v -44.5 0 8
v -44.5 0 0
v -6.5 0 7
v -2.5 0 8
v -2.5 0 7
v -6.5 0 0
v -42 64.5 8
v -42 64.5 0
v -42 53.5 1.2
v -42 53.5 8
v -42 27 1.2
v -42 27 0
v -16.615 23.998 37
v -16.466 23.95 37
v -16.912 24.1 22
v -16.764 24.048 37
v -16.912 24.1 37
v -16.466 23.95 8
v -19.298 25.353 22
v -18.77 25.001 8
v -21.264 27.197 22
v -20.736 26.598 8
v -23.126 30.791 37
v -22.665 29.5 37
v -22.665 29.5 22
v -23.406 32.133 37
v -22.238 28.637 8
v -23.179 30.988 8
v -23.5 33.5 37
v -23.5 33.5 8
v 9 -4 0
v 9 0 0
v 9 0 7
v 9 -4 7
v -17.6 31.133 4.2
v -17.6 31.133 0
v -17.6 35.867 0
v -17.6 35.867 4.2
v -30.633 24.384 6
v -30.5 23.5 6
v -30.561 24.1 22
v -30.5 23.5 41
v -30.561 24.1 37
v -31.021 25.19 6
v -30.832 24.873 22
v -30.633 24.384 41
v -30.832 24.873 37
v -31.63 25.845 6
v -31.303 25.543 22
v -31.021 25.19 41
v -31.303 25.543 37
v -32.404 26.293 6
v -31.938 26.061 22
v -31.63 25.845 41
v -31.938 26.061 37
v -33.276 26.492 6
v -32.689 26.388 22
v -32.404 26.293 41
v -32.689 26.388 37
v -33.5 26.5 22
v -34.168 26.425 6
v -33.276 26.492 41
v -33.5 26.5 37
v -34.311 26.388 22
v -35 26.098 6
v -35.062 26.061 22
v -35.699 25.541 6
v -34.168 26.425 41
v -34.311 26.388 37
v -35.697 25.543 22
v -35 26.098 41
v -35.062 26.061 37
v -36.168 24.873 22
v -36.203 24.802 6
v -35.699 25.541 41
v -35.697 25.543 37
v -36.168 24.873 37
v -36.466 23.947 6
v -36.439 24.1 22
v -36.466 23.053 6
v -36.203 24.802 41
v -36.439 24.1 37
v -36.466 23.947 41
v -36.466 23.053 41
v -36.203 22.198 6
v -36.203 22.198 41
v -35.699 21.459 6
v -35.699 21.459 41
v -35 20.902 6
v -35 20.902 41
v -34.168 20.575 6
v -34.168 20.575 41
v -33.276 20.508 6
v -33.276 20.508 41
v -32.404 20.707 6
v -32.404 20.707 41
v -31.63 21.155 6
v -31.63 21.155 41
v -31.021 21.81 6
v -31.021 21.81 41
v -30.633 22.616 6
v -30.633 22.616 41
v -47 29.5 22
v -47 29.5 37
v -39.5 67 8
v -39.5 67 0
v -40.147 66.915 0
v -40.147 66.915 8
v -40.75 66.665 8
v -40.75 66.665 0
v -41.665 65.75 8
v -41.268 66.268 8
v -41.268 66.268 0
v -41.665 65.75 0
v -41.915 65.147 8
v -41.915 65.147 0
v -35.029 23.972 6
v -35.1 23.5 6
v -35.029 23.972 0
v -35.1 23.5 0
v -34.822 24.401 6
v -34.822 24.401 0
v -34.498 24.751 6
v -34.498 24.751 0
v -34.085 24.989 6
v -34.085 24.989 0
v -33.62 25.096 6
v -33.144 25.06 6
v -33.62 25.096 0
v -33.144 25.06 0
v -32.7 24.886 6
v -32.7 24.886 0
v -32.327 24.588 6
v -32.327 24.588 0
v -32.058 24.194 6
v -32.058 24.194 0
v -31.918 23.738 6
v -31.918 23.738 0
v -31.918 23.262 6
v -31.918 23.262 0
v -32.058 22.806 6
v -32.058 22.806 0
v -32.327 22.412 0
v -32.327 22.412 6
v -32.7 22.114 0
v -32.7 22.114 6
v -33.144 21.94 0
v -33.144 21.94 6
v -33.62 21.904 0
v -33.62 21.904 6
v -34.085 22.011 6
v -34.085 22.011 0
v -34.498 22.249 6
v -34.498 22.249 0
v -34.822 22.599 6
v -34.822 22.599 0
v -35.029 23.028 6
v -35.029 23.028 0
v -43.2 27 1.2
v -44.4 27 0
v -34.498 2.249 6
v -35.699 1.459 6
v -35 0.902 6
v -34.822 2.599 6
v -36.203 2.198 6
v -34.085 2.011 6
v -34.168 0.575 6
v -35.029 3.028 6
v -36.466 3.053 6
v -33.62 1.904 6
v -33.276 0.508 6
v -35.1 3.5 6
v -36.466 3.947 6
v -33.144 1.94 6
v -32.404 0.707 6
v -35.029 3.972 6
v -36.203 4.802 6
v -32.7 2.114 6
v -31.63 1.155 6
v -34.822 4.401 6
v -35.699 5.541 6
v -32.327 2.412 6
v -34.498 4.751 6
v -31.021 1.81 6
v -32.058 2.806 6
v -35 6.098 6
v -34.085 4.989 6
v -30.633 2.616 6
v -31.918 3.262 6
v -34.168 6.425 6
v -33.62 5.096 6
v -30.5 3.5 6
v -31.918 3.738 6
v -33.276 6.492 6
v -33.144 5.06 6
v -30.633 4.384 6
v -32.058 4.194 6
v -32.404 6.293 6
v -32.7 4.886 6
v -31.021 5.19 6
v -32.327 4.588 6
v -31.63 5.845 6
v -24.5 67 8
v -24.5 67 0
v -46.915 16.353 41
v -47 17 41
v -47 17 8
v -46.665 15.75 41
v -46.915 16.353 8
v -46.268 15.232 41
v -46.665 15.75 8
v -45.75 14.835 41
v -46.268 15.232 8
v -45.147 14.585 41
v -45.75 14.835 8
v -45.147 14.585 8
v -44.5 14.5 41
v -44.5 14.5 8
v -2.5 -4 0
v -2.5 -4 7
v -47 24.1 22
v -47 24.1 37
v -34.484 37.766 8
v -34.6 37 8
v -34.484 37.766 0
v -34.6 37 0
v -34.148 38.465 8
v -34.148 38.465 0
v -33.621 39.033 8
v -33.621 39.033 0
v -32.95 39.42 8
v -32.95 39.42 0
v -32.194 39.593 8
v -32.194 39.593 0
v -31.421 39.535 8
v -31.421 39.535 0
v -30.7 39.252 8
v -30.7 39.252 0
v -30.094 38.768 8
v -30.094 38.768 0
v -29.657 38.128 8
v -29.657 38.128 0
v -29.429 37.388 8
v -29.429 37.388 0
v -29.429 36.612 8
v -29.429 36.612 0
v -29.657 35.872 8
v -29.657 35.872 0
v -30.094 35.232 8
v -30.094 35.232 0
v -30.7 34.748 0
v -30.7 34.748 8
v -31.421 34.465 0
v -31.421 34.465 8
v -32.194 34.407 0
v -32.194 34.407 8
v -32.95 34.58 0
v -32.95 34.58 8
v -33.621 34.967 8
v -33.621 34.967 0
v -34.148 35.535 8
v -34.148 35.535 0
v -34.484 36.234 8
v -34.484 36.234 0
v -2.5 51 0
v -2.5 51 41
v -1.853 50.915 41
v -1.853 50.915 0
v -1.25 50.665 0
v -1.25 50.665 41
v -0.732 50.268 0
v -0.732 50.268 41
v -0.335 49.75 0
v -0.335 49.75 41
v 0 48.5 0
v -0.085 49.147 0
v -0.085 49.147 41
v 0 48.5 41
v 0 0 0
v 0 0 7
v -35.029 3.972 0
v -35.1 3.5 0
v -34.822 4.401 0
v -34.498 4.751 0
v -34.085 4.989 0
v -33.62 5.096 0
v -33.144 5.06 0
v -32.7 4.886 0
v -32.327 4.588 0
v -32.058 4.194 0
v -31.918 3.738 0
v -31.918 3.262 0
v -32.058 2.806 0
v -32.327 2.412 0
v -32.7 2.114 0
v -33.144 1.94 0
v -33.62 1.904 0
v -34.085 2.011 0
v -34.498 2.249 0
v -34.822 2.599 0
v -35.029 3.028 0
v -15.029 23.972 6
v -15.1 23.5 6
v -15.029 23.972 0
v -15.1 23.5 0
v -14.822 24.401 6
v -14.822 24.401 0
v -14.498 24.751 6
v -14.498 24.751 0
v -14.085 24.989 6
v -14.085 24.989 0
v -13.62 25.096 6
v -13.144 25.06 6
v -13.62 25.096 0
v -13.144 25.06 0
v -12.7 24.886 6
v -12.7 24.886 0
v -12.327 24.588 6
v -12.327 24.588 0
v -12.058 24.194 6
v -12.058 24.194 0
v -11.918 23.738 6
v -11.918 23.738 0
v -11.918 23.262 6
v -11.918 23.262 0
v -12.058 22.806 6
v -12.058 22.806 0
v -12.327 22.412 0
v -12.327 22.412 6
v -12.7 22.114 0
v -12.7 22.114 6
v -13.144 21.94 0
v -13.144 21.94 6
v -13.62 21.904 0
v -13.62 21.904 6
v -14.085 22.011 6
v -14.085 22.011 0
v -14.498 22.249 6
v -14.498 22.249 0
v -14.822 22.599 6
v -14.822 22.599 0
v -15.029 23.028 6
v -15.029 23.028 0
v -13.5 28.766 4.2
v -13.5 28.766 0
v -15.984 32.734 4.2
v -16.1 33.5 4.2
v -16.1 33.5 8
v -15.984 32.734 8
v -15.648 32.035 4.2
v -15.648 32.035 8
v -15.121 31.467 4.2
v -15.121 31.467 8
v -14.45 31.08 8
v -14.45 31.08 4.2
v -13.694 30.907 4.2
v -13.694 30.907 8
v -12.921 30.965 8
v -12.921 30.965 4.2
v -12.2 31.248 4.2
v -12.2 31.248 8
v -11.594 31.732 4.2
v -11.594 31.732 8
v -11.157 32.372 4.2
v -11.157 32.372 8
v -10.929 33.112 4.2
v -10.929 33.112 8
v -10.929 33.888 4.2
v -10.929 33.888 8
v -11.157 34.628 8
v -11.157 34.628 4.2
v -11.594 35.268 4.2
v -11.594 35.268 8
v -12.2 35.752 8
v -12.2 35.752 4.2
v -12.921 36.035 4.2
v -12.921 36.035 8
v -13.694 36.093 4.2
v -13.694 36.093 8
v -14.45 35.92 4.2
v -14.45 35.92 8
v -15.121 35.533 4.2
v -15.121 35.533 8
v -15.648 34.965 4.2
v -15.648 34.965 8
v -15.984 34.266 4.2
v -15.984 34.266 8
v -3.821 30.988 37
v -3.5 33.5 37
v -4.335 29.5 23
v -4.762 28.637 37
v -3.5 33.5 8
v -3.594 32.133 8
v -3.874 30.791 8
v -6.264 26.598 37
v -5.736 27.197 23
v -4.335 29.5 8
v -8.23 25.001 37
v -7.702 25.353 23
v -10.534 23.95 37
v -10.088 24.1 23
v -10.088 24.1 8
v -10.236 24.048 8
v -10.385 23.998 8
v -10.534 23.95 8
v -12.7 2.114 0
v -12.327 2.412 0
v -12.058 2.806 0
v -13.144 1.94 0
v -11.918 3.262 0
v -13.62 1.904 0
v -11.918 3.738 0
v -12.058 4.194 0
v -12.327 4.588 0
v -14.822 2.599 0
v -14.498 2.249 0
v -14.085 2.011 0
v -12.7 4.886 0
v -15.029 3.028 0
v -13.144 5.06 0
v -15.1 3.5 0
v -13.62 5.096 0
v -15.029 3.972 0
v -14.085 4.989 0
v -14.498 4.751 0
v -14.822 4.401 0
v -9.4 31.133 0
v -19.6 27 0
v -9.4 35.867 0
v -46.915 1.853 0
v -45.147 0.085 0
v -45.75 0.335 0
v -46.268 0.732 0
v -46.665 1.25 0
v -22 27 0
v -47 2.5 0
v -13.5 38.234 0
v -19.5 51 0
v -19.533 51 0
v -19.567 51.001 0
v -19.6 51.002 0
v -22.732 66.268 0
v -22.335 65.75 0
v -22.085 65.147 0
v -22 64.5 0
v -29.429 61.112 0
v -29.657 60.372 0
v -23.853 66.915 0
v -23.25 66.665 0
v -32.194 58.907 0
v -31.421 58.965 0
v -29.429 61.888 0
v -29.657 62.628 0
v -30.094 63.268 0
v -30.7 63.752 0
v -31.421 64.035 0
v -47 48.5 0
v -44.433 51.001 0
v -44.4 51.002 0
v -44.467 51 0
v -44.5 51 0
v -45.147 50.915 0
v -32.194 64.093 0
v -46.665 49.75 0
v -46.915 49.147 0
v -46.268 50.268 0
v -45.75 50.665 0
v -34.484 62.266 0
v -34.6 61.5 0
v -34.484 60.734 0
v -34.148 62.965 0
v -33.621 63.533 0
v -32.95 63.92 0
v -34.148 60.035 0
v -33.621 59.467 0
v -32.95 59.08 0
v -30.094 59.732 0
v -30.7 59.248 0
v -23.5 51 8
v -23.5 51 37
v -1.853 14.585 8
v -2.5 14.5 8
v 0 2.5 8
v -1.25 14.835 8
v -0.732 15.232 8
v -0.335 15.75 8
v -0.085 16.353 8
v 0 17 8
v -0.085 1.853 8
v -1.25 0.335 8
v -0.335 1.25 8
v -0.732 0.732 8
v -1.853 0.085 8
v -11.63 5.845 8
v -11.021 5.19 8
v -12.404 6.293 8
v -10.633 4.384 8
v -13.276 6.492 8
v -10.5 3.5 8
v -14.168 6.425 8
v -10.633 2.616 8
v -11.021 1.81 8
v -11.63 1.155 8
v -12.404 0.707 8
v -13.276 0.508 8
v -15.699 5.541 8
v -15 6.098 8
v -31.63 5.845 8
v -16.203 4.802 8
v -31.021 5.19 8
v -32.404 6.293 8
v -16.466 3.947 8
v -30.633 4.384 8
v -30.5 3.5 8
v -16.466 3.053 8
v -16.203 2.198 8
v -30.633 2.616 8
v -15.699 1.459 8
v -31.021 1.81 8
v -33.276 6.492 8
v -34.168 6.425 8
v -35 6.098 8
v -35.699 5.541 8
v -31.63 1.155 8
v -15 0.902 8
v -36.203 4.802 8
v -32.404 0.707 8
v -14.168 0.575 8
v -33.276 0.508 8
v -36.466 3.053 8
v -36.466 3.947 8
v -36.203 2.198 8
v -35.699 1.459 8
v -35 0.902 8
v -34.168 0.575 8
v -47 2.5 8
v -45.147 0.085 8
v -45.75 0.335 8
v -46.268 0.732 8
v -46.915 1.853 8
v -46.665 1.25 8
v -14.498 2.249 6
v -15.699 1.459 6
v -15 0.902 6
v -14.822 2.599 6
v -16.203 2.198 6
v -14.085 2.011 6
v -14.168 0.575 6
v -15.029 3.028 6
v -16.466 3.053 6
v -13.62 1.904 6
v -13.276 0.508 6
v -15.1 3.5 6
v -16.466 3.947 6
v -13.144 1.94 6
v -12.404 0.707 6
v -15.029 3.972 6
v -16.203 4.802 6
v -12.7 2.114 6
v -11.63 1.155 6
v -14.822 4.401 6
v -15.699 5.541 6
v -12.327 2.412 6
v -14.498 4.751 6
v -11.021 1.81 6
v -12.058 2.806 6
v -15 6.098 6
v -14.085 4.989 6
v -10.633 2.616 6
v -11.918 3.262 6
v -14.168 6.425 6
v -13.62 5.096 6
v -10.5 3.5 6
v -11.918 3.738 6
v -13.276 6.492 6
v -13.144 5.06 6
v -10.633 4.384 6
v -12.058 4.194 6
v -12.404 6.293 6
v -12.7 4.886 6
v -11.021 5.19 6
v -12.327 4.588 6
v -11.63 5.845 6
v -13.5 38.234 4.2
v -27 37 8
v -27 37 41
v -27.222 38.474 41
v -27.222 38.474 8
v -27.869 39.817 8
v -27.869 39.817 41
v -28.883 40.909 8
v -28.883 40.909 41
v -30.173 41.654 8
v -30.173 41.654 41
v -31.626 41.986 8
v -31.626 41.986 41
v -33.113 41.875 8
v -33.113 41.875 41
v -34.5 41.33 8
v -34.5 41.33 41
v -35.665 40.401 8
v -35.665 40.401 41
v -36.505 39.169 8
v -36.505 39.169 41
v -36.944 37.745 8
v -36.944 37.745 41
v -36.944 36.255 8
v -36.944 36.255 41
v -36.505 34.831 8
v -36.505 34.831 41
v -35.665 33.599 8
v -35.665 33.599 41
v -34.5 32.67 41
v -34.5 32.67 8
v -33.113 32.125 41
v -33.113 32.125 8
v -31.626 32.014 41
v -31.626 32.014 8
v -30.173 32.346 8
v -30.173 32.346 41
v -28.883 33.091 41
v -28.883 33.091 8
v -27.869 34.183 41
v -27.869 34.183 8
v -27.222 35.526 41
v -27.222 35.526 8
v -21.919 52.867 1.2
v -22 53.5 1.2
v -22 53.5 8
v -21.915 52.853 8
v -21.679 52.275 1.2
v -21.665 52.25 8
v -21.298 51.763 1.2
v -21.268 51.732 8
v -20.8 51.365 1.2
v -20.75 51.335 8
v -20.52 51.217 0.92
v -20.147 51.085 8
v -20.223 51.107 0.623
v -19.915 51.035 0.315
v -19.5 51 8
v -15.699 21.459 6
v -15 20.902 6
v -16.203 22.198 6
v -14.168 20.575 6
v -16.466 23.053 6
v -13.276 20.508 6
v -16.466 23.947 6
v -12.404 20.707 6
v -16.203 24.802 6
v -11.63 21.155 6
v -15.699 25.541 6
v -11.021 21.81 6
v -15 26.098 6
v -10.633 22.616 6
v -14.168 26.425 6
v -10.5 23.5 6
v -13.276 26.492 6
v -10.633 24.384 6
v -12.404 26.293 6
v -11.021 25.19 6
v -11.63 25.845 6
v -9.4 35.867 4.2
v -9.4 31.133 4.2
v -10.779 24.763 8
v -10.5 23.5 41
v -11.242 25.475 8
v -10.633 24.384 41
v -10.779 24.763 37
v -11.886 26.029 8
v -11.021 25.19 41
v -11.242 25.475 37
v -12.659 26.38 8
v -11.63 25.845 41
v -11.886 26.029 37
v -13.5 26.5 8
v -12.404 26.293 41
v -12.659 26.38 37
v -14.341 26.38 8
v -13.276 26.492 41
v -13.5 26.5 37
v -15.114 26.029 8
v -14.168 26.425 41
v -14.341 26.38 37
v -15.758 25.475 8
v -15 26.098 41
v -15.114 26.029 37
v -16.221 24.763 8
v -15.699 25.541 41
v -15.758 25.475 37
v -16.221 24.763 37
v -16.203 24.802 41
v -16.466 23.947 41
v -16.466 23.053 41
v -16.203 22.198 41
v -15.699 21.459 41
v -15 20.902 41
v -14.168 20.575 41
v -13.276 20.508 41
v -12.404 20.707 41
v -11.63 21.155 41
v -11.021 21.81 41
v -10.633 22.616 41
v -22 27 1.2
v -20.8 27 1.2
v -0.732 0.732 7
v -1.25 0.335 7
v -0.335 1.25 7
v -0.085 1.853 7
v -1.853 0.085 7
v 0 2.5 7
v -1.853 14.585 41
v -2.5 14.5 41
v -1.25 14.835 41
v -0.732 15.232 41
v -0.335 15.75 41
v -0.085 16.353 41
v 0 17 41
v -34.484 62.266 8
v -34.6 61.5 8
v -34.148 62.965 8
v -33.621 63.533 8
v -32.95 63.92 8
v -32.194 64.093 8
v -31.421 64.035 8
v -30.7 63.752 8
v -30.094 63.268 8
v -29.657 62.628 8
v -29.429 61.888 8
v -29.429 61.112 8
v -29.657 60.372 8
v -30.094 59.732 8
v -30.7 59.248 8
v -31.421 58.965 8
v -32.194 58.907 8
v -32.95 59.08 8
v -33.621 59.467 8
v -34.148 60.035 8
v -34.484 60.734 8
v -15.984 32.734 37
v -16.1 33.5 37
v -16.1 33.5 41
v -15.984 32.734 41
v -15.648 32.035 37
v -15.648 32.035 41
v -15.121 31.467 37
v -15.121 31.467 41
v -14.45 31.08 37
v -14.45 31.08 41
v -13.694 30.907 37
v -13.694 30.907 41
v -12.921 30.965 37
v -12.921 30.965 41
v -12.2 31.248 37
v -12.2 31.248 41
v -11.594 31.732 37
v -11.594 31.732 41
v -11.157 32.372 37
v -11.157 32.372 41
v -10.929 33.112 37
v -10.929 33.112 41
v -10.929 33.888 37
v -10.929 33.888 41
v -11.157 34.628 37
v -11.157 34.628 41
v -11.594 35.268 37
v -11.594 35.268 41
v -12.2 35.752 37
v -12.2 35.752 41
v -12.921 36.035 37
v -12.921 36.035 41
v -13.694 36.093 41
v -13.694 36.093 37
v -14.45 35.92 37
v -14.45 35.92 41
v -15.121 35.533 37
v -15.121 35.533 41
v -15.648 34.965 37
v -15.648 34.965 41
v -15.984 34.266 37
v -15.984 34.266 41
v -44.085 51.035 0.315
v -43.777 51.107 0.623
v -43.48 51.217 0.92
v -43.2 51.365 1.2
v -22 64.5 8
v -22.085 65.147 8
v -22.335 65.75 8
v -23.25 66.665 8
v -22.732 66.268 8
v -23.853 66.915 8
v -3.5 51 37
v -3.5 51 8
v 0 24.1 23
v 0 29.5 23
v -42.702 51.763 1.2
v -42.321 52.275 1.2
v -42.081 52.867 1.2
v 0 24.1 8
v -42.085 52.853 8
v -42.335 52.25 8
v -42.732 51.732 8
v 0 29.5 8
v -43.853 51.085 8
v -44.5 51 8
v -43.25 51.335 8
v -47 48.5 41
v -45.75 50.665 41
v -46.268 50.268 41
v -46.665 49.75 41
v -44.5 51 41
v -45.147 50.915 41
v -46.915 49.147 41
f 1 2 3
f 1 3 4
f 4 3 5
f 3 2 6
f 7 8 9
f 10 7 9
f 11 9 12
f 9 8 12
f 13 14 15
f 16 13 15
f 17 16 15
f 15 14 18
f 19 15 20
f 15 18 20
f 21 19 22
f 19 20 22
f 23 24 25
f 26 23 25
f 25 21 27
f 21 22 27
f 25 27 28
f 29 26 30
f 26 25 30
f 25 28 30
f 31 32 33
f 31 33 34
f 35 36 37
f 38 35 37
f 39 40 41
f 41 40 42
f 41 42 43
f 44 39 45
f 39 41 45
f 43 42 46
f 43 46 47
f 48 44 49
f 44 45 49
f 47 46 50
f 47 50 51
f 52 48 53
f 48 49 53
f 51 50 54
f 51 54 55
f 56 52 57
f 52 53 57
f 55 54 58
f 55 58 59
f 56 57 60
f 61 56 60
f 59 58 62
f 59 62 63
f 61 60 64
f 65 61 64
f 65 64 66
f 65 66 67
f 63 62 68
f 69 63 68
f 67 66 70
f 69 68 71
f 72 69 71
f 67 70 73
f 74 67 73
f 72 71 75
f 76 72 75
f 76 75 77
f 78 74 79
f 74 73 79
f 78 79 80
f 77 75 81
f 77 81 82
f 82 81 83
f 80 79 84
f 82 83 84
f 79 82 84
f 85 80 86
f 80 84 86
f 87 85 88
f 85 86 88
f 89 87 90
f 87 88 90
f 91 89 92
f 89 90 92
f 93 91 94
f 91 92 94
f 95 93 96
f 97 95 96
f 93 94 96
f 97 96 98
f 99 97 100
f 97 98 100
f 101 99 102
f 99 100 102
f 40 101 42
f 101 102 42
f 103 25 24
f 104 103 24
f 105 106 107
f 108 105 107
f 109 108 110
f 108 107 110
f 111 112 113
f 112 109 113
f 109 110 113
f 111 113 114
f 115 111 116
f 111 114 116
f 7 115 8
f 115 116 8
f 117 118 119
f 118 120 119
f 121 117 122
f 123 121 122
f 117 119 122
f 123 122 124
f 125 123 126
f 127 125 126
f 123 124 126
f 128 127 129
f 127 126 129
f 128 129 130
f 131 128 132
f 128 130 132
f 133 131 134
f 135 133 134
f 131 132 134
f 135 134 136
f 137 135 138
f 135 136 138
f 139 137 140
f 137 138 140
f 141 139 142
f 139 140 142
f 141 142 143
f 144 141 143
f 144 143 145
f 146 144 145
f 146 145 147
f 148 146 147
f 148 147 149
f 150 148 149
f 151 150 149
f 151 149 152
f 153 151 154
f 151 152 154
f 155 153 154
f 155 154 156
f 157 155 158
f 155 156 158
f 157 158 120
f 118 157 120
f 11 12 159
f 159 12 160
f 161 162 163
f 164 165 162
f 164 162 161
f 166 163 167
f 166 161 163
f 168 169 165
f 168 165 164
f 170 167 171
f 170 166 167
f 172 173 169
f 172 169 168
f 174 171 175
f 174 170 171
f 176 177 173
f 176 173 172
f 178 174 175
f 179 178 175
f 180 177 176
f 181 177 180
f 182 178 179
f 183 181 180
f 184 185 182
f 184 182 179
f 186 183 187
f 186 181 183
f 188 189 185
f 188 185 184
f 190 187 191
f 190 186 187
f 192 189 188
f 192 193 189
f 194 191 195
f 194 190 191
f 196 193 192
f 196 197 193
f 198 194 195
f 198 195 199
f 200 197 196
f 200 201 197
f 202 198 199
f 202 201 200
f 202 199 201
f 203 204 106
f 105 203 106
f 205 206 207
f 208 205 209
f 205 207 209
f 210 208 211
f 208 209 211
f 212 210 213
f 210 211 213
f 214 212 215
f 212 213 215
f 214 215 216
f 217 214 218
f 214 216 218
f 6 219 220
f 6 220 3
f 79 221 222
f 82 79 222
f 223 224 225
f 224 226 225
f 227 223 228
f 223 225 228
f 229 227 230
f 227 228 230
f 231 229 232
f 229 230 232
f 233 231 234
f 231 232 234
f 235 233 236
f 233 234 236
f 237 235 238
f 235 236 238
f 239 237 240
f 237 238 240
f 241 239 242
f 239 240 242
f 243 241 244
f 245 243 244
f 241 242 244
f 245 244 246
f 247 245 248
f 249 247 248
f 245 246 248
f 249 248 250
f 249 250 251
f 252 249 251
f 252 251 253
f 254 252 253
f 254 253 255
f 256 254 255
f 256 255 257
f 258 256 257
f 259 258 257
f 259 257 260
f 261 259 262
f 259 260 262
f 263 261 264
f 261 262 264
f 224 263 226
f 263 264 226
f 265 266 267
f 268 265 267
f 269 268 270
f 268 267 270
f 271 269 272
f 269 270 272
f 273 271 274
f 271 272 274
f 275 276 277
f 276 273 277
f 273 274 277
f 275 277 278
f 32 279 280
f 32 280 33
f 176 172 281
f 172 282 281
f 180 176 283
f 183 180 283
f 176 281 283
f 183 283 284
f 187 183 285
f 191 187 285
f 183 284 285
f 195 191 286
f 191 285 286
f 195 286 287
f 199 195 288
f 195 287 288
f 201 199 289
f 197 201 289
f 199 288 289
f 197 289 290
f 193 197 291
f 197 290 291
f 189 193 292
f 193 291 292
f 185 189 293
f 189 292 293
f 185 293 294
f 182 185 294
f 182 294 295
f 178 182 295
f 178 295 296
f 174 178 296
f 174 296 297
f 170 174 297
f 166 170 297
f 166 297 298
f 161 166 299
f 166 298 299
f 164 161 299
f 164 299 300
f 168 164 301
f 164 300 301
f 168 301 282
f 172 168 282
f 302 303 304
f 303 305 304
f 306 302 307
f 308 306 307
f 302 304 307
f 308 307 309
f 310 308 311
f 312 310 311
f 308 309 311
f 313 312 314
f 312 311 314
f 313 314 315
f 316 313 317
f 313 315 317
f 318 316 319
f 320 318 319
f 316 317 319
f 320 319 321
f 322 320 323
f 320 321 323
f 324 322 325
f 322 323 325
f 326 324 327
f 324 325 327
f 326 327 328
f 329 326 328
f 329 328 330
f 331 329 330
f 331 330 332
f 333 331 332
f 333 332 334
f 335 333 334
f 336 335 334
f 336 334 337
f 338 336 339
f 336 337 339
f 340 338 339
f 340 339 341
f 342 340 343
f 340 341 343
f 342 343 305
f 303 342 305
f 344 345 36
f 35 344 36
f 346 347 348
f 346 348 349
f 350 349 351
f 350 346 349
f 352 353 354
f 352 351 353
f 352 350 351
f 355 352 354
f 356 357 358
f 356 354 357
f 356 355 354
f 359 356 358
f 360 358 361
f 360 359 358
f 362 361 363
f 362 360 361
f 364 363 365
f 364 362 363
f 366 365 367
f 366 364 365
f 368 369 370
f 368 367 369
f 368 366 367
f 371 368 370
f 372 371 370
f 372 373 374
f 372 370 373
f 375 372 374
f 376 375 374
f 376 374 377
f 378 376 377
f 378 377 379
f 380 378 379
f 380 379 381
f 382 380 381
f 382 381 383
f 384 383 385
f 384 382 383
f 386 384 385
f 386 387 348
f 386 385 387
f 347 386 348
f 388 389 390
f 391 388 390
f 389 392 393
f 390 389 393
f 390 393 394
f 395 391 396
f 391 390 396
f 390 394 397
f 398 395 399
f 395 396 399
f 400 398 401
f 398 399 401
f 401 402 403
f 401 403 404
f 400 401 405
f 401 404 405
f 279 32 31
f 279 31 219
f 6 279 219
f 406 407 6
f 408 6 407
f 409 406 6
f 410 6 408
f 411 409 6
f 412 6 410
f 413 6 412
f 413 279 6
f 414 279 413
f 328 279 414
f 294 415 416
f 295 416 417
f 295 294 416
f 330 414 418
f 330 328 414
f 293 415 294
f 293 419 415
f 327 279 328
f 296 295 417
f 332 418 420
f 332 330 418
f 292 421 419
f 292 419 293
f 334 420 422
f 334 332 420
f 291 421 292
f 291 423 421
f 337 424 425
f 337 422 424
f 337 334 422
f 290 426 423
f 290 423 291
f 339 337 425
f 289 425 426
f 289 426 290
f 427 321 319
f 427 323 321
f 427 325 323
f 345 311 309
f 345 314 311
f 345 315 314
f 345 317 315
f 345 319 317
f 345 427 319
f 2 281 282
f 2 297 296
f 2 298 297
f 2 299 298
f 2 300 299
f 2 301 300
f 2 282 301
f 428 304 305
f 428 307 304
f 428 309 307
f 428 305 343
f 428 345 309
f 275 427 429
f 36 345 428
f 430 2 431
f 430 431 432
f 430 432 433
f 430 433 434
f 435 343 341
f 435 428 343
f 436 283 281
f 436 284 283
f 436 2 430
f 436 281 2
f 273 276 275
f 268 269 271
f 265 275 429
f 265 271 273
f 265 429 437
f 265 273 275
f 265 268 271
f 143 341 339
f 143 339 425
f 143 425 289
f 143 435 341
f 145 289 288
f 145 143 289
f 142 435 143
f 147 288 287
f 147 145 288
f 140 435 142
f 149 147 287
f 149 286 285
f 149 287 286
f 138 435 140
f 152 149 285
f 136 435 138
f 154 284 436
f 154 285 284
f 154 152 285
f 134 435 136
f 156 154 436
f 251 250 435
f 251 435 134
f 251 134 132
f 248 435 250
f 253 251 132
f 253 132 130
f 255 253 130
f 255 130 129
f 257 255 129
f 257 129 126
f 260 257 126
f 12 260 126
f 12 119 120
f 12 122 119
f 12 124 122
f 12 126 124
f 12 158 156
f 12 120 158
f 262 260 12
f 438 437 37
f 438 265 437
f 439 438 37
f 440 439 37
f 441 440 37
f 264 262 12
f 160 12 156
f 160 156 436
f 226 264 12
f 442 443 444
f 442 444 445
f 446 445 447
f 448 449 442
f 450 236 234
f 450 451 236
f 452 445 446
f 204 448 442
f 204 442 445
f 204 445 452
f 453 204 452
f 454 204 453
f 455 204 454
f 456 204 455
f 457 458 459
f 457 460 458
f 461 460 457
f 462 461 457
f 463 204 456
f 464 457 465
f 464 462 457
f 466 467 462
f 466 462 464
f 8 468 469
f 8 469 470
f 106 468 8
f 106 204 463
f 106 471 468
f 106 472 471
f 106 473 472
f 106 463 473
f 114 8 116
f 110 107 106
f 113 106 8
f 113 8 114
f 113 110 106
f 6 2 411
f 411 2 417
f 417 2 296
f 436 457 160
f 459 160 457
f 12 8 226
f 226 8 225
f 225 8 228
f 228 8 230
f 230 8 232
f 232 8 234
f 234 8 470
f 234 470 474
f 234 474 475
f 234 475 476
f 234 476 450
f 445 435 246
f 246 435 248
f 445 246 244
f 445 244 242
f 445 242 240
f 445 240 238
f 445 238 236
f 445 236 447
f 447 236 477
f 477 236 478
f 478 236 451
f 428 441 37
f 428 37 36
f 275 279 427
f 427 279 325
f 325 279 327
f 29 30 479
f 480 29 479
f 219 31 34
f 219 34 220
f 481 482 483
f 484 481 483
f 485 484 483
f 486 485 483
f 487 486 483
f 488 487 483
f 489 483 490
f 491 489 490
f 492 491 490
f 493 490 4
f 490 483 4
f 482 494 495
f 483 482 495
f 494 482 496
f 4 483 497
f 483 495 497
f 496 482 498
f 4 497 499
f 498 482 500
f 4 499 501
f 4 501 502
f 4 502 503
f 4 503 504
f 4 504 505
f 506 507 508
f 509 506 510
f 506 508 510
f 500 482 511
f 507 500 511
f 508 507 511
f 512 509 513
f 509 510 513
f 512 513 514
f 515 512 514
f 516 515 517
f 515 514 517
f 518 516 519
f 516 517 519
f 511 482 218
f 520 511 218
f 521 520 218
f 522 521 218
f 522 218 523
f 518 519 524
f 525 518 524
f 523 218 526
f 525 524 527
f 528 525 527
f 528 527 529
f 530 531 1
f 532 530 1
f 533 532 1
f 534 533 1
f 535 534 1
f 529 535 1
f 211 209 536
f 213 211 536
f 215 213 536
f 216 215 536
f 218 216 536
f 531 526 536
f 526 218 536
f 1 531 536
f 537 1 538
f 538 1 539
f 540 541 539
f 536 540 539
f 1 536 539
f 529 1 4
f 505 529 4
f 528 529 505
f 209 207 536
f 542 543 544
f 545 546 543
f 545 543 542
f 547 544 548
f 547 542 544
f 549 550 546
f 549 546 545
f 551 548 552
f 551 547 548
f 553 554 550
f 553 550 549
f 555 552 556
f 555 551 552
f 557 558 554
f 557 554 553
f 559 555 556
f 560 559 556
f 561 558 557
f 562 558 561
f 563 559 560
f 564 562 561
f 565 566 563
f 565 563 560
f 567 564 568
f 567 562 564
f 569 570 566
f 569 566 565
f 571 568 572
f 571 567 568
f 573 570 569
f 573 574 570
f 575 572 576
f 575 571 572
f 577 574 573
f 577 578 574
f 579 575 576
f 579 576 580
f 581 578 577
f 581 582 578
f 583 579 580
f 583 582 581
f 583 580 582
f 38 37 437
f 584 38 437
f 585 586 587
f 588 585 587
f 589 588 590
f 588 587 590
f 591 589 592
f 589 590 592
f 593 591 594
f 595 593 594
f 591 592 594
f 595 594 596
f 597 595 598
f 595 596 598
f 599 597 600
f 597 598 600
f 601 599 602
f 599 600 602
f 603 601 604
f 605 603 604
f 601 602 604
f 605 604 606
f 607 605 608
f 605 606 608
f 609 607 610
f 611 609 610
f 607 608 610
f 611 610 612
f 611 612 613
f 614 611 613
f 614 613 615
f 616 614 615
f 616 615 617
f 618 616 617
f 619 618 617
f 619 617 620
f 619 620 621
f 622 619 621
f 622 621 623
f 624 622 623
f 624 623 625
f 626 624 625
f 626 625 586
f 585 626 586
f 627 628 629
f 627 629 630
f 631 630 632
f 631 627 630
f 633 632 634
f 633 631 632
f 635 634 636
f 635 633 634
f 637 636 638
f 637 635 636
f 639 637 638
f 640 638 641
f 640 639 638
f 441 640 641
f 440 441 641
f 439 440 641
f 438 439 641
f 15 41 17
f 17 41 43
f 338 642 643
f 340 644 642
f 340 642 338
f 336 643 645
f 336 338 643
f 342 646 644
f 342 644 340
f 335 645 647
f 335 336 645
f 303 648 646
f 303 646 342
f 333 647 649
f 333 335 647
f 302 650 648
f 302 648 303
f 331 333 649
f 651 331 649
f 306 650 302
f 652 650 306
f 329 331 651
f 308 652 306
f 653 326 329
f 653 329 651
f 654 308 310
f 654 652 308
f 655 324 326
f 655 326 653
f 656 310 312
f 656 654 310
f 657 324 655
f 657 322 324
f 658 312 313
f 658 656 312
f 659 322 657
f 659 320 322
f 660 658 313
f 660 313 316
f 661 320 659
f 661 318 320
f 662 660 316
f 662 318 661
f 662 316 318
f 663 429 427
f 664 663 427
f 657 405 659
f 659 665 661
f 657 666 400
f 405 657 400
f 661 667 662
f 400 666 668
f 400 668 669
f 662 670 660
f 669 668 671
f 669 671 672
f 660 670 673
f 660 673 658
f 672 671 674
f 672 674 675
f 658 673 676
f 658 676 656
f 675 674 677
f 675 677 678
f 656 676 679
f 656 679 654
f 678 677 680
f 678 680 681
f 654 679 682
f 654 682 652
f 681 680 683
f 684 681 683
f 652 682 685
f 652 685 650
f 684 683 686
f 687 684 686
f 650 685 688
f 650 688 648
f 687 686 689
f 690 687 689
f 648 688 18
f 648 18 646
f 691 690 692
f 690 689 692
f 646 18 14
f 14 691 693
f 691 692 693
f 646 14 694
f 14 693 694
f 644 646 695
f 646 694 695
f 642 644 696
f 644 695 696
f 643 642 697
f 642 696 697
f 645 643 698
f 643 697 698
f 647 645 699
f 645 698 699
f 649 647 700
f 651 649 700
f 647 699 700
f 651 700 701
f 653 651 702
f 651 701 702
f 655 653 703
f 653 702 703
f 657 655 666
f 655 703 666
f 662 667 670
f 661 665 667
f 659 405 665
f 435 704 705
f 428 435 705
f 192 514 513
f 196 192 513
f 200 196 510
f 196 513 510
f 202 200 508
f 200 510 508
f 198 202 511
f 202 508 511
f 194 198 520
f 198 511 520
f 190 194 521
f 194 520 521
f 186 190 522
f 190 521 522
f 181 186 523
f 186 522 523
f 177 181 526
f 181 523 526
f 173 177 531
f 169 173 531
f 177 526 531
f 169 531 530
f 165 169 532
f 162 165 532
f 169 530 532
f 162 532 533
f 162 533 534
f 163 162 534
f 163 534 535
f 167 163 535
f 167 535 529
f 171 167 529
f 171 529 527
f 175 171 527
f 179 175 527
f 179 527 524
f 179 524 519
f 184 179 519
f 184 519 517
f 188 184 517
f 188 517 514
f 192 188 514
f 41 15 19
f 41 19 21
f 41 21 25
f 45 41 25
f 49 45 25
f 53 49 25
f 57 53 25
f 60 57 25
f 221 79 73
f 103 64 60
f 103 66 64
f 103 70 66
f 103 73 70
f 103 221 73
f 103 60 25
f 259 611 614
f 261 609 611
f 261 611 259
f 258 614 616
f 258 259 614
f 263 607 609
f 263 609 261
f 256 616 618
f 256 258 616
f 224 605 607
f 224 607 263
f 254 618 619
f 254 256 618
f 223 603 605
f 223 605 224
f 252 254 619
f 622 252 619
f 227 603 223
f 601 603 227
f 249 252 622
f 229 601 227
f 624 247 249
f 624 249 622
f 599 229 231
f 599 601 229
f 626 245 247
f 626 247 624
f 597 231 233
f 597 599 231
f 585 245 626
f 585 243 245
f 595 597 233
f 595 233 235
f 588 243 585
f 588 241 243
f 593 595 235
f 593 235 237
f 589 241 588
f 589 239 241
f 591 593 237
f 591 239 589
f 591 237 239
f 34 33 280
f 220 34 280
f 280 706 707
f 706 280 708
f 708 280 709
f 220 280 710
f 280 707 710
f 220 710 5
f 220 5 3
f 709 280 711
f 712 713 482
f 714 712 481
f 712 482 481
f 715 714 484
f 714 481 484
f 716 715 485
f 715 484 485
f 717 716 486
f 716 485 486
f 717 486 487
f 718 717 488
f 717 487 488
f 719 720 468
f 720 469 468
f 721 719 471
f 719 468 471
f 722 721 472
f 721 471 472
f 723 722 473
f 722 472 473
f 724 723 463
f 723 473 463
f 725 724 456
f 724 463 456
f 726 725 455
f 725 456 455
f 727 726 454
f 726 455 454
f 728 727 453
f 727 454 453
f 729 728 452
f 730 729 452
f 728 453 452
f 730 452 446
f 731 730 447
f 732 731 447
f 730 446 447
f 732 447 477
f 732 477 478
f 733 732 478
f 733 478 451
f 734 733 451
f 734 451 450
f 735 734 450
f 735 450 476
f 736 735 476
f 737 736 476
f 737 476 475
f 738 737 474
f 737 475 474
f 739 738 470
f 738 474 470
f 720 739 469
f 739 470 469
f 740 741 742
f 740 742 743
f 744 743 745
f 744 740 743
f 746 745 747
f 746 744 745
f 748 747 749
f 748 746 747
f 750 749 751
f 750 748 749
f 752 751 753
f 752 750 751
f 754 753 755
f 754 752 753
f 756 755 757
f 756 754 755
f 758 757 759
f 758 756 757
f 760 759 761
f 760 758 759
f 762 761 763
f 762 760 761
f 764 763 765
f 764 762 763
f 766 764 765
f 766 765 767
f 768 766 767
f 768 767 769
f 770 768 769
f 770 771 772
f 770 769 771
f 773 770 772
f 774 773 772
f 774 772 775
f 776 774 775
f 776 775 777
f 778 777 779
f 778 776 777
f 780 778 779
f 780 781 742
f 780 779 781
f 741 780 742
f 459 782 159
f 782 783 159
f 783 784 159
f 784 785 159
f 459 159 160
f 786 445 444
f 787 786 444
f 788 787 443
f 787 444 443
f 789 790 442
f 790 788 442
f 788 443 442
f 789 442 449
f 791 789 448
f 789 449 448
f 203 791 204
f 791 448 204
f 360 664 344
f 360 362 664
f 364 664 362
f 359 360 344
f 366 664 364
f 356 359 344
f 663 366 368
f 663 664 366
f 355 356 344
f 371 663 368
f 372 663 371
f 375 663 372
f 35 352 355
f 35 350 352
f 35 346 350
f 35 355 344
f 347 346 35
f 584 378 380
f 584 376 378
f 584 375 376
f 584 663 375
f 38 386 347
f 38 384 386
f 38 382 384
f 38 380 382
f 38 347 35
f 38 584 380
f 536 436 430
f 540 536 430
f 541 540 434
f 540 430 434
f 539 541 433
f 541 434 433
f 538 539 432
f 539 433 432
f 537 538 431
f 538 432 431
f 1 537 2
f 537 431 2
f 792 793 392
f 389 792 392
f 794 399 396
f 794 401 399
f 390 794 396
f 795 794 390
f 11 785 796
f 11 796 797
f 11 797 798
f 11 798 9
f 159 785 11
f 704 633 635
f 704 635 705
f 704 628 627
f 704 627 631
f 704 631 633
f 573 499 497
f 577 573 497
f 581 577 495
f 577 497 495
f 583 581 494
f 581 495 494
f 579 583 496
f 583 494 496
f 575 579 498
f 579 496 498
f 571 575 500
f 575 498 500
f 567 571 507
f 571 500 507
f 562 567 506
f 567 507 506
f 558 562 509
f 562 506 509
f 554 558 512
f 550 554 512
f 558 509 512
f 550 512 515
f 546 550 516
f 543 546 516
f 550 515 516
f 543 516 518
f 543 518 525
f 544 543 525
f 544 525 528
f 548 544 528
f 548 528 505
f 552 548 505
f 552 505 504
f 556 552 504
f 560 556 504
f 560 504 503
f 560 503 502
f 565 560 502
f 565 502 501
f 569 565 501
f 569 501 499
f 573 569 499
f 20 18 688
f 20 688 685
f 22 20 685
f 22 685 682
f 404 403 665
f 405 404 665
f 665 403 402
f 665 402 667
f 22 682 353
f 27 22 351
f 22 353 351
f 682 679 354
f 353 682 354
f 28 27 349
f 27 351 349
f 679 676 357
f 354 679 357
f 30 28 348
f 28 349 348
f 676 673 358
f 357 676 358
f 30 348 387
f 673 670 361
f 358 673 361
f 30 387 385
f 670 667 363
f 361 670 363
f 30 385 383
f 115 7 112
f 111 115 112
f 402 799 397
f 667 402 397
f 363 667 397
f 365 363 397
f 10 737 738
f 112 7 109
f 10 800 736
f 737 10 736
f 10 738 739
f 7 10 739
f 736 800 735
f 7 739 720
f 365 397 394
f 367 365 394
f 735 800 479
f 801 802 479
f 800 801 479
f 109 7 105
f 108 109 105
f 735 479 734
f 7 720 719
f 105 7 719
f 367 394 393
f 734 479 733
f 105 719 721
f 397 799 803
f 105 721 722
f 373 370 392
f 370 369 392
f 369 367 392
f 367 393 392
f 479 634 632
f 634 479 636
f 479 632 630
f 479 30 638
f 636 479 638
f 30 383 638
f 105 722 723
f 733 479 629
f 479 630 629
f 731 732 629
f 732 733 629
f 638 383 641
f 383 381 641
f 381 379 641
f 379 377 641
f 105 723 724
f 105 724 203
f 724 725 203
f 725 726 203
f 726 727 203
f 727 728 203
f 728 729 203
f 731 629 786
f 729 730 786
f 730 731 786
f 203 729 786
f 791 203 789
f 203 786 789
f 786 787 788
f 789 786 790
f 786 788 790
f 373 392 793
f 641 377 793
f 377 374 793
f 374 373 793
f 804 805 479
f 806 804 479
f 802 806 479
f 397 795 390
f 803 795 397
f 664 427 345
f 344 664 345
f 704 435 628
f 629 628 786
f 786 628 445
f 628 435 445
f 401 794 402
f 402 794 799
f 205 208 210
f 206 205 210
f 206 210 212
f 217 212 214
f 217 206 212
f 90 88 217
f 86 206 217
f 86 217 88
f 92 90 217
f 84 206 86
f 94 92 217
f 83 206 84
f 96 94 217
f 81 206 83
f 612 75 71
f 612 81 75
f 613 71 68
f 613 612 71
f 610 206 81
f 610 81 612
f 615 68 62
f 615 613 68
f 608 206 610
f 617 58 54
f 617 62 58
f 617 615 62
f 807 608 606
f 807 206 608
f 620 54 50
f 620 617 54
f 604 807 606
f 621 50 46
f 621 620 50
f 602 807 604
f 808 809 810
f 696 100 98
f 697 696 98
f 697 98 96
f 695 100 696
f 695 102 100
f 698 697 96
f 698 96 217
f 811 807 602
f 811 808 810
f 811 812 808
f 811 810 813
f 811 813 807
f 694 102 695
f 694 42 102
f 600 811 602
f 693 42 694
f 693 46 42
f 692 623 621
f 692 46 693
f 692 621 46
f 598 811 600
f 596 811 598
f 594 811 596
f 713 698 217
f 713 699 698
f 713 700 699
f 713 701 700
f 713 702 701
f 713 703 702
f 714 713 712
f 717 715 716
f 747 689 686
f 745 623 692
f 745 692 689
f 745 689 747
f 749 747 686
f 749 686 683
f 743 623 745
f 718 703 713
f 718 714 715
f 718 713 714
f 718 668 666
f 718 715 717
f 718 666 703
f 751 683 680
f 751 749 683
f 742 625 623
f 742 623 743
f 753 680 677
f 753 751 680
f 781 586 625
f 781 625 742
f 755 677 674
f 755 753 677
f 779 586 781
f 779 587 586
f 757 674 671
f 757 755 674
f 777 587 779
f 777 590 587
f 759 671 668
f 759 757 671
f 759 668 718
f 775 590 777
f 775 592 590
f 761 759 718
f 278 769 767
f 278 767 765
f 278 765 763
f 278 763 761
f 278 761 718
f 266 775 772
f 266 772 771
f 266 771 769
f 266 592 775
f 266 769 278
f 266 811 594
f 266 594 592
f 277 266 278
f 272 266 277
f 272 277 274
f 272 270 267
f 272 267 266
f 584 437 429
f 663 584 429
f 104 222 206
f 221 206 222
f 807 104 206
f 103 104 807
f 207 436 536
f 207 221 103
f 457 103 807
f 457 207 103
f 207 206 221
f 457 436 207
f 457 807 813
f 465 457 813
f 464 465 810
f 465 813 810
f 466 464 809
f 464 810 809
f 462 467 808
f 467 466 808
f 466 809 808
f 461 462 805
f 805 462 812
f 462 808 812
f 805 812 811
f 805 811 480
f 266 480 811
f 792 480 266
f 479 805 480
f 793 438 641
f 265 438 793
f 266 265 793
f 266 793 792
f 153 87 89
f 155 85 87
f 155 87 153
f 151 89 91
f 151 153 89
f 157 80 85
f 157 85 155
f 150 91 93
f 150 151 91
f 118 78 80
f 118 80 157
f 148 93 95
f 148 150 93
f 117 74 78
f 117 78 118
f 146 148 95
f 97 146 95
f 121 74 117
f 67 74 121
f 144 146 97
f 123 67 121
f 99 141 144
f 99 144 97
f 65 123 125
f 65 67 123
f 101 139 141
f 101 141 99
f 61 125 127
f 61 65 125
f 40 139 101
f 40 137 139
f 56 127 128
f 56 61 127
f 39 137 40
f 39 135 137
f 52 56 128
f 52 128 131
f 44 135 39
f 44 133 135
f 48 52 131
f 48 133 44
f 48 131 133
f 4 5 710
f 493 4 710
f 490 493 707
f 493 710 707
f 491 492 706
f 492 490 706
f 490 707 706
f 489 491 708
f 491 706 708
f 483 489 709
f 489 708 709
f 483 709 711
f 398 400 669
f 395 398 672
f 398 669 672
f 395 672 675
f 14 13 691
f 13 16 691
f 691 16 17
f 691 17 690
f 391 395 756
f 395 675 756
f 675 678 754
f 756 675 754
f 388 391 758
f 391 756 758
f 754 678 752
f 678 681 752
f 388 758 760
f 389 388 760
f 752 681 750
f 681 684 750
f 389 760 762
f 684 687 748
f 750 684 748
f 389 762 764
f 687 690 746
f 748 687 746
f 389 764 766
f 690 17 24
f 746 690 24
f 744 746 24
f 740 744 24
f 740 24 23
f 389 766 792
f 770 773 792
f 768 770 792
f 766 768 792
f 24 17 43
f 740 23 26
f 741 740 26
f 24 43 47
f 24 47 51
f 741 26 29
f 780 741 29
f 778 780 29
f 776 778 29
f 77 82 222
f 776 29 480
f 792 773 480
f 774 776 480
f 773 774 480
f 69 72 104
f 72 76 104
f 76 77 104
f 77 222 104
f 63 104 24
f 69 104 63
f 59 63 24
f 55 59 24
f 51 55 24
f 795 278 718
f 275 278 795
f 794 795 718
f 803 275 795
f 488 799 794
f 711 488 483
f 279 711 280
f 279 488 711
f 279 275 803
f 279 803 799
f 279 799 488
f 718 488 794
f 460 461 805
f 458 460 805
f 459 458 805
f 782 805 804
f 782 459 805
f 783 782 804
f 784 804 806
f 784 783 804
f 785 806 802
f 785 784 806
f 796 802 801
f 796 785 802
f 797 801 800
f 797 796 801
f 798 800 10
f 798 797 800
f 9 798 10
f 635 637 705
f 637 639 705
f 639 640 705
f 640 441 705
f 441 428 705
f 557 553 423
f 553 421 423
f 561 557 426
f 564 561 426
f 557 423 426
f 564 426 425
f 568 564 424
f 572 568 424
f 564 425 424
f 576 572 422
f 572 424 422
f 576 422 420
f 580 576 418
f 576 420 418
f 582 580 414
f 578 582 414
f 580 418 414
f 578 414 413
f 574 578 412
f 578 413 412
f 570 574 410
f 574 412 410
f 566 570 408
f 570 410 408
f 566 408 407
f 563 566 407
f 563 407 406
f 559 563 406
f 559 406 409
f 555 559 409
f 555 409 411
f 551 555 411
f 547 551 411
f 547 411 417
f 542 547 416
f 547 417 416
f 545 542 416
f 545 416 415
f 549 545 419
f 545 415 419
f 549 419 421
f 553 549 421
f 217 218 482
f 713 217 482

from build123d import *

# Parameters (mm, degrees)
EXTRUDE_1_DEPTH             = 8
EXTRUDE_9_DEPTH             = 29
SKETCH_25_W                 = 47
SKETCH_25_H                 = 36.5
EXTRUDE_10_DEPTH            = 4
HOLE_WIZARD_M51_D           = 3.2
HOLE_WIZARD_M51_CBORE_D     = 6
HOLE_WIZARD_M51_CBORE_DEPTH = 35
SKETCH_22_R                 = 2.6
CUT_EXTRUDE_9_DEPTH         = 92.536877814
CUT_EXTRUDE_10_DEPTH        = 4.2
HOLE_WIZARD_M52_D           = 5.2
HOLE_WIZARD_M52_CBORE_D     = 10
HOLE_WIZARD_M52_CBORE_DEPTH = 33
CUT_EXTRUDE_11_DEPTH        = 24
FILLET_1_R                  = 2.5
EXTRUDE_11_DEPTH            = 7
SKETCH_32_W                 = 15
SKETCH_32_H                 = 5.4
CUT_EXTRUDE_12_DEPTH        = 13.5
SKETCH_33_W                 = 15
SKETCH_33_H                 = 5.4
CUT_EXTRUDE_13_DEPTH        = 33.5


with BuildPart() as part:
    # Эскиз1 → Бобышка-Вытянуть1 (new body)
    with BuildSketch(Plane.XY):
        Polygon((-47, 51), (-47, 0), (0, 0), (0, 51), (-22, 51), (-22, 67), (-42, 67), (-42, 51), align=None)
    extrude(amount=EXTRUDE_1_DEPTH)

    # Эскиз24 → Бобышка-Вытянуть9 (add)
    with BuildSketch(Plane.XY.offset(8)):
        with BuildLine():
            Line((0, 51), (-3.5, 51))
            Line((-3.5, 51), (-3.5, 33.5))
            ThreePointArc((-3.5, 33.5), (-13.5, 23.5), (-23.5, 33.5))
            Line((-23.5, 33.5), (-23.5, 51))
            Line((-23.5, 51), (-47, 51))
            Line((-47, 51), (-47, 14.5))
            Line((-47, 14.5), (0, 14.5))
            Line((0, 14.5), (0, 51))
        make_face()
    extrude(amount=EXTRUDE_9_DEPTH)

    # Эскиз25 → Бобышка-Вытянуть10 (add)
    with BuildSketch(Plane.XY.offset(37)):
        with Locations((-23.5, 32.75)):
            Rectangle(SKETCH_25_W, SKETCH_25_H)
    extrude(amount=EXTRUDE_10_DEPTH)

    # Цековка для  болта с шестигранной головкой M51 (through all)
    with Locations(Plane(origin=(-33.5, 3.5, 41), x_dir=(1, 0, 0), z_dir=(0, 0, 1))):
        with Locations((0, 0), (0, 20), (20, 0), (20, 20)):
            CounterBoreHole(HOLE_WIZARD_M51_D / 2, HOLE_WIZARD_M51_CBORE_D / 2, HOLE_WIZARD_M51_CBORE_DEPTH)

    # Эскиз22 → Вырез-Вытянуть9 (cut, through all)
    with BuildSketch(Plane.XY):
        with Locations(Location((-13.5, 33.5, 0), (0, 0, 180))):
            Circle(SKETCH_22_R)
    extrude(amount=CUT_EXTRUDE_9_DEPTH, mode=Mode.SUBTRACT)

    # Эскиз23 → Вырез-Вытянуть10 (cut)
    with BuildSketch(Plane(origin=(0, 0, 0), x_dir=(-1, 0, 0), z_dir=(0, 0, -1))):
        Polygon((13.5, 38.234272207), (9.4, 35.867136104), (9.4, 31.132863896), (13.5, 28.765727793), (17.6, 31.132863896), (17.6, 35.867136104), align=None)
    extrude(amount=-CUT_EXTRUDE_10_DEPTH, mode=Mode.SUBTRACT)

    # Цековка для  болта с шестигранной головкой M52 (through all)
    with Locations(Plane(origin=(-32, 61.5, 41), x_dir=(1, 0, 0), z_dir=(0, 0, 1))):
        with Locations((0, 0), (0, -24.5)):
            CounterBoreHole(HOLE_WIZARD_M52_D / 2, HOLE_WIZARD_M52_CBORE_D / 2, HOLE_WIZARD_M52_CBORE_DEPTH)

    # Эскиз30 → Вырез-Вытянуть11 (cut)
    with BuildSketch(Plane(origin=(0, 51, 0), x_dir=(1, 0, 0), z_dir=(0, 1, 0))):
        Polygon((-42, 0), (-42, -1.2), (-43.2, -1.2), (-44.4, 0), align=None)
        Polygon((-22, 0), (-22, -1.2), (-20.8, -1.2), (-19.6, 0), align=None)
    extrude(amount=-CUT_EXTRUDE_11_DEPTH, mode=Mode.SUBTRACT)

    # Скругление1
    # the kernel refuses this fillet: 2.5 mm, written as the material it adds along each edge
    with BuildSketch(Plane(origin=(-22, 51, -5.05), x_dir=(0, 1, 0), z_dir=(0, 0, 1))) as fillet_1_piece_1_section:
        with BuildLine():
            CenterArc((FILLET_1_R, -FILLET_1_R), FILLET_1_R, 90, 90)
            Line((0, -FILLET_1_R), (0, 0))
            Line((0, 0), (FILLET_1_R, 0))
        make_face()
    fillet_1_piece_1 = extrude(amount=13.05, mode=Mode.PRIVATE)
    fillet_1_piece_1 = split(fillet_1_piece_1, bisect_by=Plane(origin=(-20.123471849, 51.026696565, 0), z_dir=(0, 0, 1)), keep=Keep.TOP, mode=Mode.PRIVATE)
    fillet_1_piece_1 = split(fillet_1_piece_1, bisect_by=Plane(origin=(-20.123471849, 51.026696565, 1.2), z_dir=(0, 0, -1)), keep=Keep.TOP, mode=Mode.PRIVATE)
    fillet_1_piece_1 = split(fillet_1_piece_1, bisect_by=Plane(origin=(-20.293433634, 51.026696565, 0.693433634), z_dir=(0.7071067811865498, 0, 0.7071067811865455)), keep=Keep.TOP, mode=Mode.PRIVATE)
    add(fillet_1_piece_1)
    with BuildSketch(Plane(origin=(-22, 51, 1.2), x_dir=(0, 1, 0), z_dir=(0, 0, 1))) as fillet_1_piece_2_section:
        with BuildLine():
            CenterArc((FILLET_1_R, -FILLET_1_R), FILLET_1_R, 90, 90)
            Line((0, -FILLET_1_R), (0, 0))
            Line((0, 0), (FILLET_1_R, 0))
        make_face()
    fillet_1_piece_2 = extrude(amount=6.8, mode=Mode.PRIVATE)
    fillet_1_piece_2 = split(fillet_1_piece_2, bisect_by=Plane(origin=(-21.509165304, 51.769559816, 1.909165304), z_dir=(-0.7071067811865498, 0, -0.7071067811865455)), keep=Keep.TOP, mode=Mode.PRIVATE)
    add(fillet_1_piece_2)
    with BuildSketch(Plane(origin=(-22, 51, 1.2), x_dir=(0, 1, 0), z_dir=(0, 0, 1))) as fillet_1_piece_3_section:
        with BuildLine():
            CenterArc((FILLET_1_R, -FILLET_1_R), FILLET_1_R, 90, 90)
            Line((0, -FILLET_1_R), (0, 0))
            Line((0, 0), (FILLET_1_R, 0))
        make_face()
    fillet_1_piece_3 = extrude(amount=6.8, mode=Mode.PRIVATE)
    fillet_1_piece_3 = split(fillet_1_piece_3, bisect_by=Plane(origin=(-22.965000899, 51.542951648, 3.365000899), z_dir=(0.7071067811865498, 0, 0.7071067811865455)), keep=Keep.TOP, mode=Mode.PRIVATE)
    add(fillet_1_piece_3)
    with BuildSketch(Plane(origin=(-42, 51, -5.05), x_dir=(0, 1, 0), z_dir=(0, 0, 1))) as fillet_1_piece_4_section:
        with BuildLine():
            CenterArc((FILLET_1_R, FILLET_1_R), FILLET_1_R, 180, 90)
            Line((0, FILLET_1_R), (0, 0))
            Line((0, 0), (FILLET_1_R, 0))
        make_face()
    fillet_1_piece_4 = extrude(amount=13.05, mode=Mode.PRIVATE)
    fillet_1_piece_4 = split(fillet_1_piece_4, bisect_by=Plane(origin=(-43.876528151, 51.026696565, 0), z_dir=(0, 0, 1)), keep=Keep.TOP, mode=Mode.PRIVATE)
    fillet_1_piece_4 = split(fillet_1_piece_4, bisect_by=Plane(origin=(-43.706566366, 51.026696565, 0.693433634), z_dir=(-0.7071067811865488, 0, 0.7071067811865464)), keep=Keep.TOP, mode=Mode.PRIVATE)
    fillet_1_piece_4 = split(fillet_1_piece_4, bisect_by=Plane(origin=(-43.876528151, 51.026696565, 1.2), z_dir=(0, 0, -1)), keep=Keep.TOP, mode=Mode.PRIVATE)
    add(fillet_1_piece_4)
    with BuildSketch(Plane(origin=(-42, 51, 1.2), x_dir=(0, 1, 0), z_dir=(0, 0, 1))) as fillet_1_piece_5_section:
        with BuildLine():
            CenterArc((FILLET_1_R, FILLET_1_R), FILLET_1_R, 180, 90)
            Line((0, FILLET_1_R), (0, 0))
            Line((0, 0), (FILLET_1_R, 0))
        make_face()
    fillet_1_piece_5 = extrude(amount=6.8, mode=Mode.PRIVATE)
    fillet_1_piece_5 = split(fillet_1_piece_5, bisect_by=Plane(origin=(-42.490834696, 51.769559816, 1.909165304), z_dir=(0.7071067811865488, 0, -0.7071067811865464)), keep=Keep.TOP, mode=Mode.PRIVATE)
    add(fillet_1_piece_5)
    with BuildSketch(Plane(origin=(-42, 51, 1.2), x_dir=(0, 1, 0), z_dir=(0, 0, 1))) as fillet_1_piece_6_section:
        with BuildLine():
            CenterArc((FILLET_1_R, FILLET_1_R), FILLET_1_R, 180, 90)
            Line((0, FILLET_1_R), (0, 0))
            Line((0, 0), (FILLET_1_R, 0))
        make_face()
    fillet_1_piece_6 = extrude(amount=6.8, mode=Mode.PRIVATE)
    fillet_1_piece_6 = split(fillet_1_piece_6, bisect_by=Plane(origin=(-41.034999101, 51.542951648, 3.365000899), z_dir=(-0.7071067811865488, 0, 0.7071067811865464)), keep=Keep.TOP, mode=Mode.PRIVATE)
    add(fillet_1_piece_6)
    # the kernel refuses this fillet: 2.5 mm, written as the material it takes off along each edge
    with BuildSketch(Plane(origin=(-47, 0, -6.25), x_dir=(0, 1, 0), z_dir=(0, 0, 1))) as fillet_1_2_piece_1:
        with BuildLine():
            CenterArc((FILLET_1_R, -FILLET_1_R), FILLET_1_R, 90, 90)
            Line((0, -FILLET_1_R), (0, 0))
            Line((0, 0), (FILLET_1_R, 0))
        make_face()
    extrude(amount=20.5, mode=Mode.SUBTRACT)
    with BuildSketch(Plane(origin=(-22, 67, -6.25), x_dir=(-1, 0, 0), z_dir=(0, 0, 1)), Plane(origin=(0, 0, -6.25), x_dir=(0, 1, 0), z_dir=(0, 0, 1)), Plane(origin=(-42, 67, -6.25), x_dir=(0, -1, 0), z_dir=(0, 0, 1))) as fillet_1_2_piece_2:
        with BuildLine():
            CenterArc((FILLET_1_R, FILLET_1_R), FILLET_1_R, 180, 90)
            Line((0, FILLET_1_R), (0, 0))
            Line((0, 0), (FILLET_1_R, 0))
        make_face()
    extrude(amount=20.5, mode=Mode.SUBTRACT)
    with BuildSketch(Plane(origin=(0, 51, 47.25), x_dir=(0, -1, 0), z_dir=(0, 0, -1))) as fillet_1_2_piece_3:
        with BuildLine():
            CenterArc((FILLET_1_R, FILLET_1_R), FILLET_1_R, 180, 90)
            Line((0, FILLET_1_R), (0, 0))
            Line((0, 0), (FILLET_1_R, 0))
        make_face()
    extrude(amount=53.5, mode=Mode.SUBTRACT)
    with BuildSketch(Plane(origin=(-47, 51, 47.25), x_dir=(0, -1, 0), z_dir=(0, 0, -1))) as fillet_1_2_piece_4:
        with BuildLine():
            CenterArc((FILLET_1_R, -FILLET_1_R), FILLET_1_R, 90, 90)
            Line((0, -FILLET_1_R), (0, 0))
            Line((0, 0), (FILLET_1_R, 0))
        make_face()
    extrude(amount=53.5, mode=Mode.SUBTRACT)
    with BuildSketch(Plane(origin=(-47, 14.5, 8), x_dir=(0, 1, 0), z_dir=(0, 0, 1))) as fillet_1_2_piece_5:
        with BuildLine():
            CenterArc((FILLET_1_R, -FILLET_1_R), FILLET_1_R, 90, 90)
            Line((0, -FILLET_1_R), (0, 0))
            Line((0, 0), (FILLET_1_R, 0))
        make_face()
    extrude(amount=39.25, mode=Mode.SUBTRACT)
    with BuildSketch(Plane(origin=(0, 14.5, 8), x_dir=(0, 1, 0), z_dir=(0, 0, 1))) as fillet_1_2_piece_6:
        with BuildLine():
            CenterArc((FILLET_1_R, FILLET_1_R), FILLET_1_R, 180, 90)
            Line((0, FILLET_1_R), (0, 0))
            Line((0, 0), (FILLET_1_R, 0))
        make_face()
    extrude(amount=39.25, mode=Mode.SUBTRACT)

    # Эскиз31 → Бобышка-Вытянуть11 (add)
    with BuildSketch(Plane(origin=(0, 0, 0), x_dir=(-1, 0, 0), z_dir=(0, 0, -1))):
        with BuildLine():
            Line((0, 0), (-9, 0))
            Line((-9, 0), (-9, -4))
            Line((-9, -4), (2.5, -4))
            Line((2.5, -4), (6.5, 0))
            Line((6.5, 0), (2.5, 0))
            ThreePointArc((2.5, 0), (0.732233047, 0.732233047), (0, 2.5))
            Line((0, 2.5), (0, 0))
        make_face()
    extrude(amount=-EXTRUDE_11_DEPTH)

    # Эскиз32 → Вырез-Вытянуть12 (cut)
    with BuildSketch(Plane(origin=(0, 0, 0), x_dir=(0, 0, -1), z_dir=(1, 0, 0))):
        with Locations((-15.5, 26.8)):
            Rectangle(SKETCH_32_W, SKETCH_32_H)
    extrude(amount=-CUT_EXTRUDE_12_DEPTH, mode=Mode.SUBTRACT)

    # Эскиз33 → Вырез-Вытянуть13 (cut)
    with BuildSketch(Plane.ZY.offset(47)):
        with Locations((29.5, 26.8)):
            Rectangle(SKETCH_33_W, SKETCH_33_H)
    extrude(amount=-CUT_EXTRUDE_13_DEPTH, mode=Mode.SUBTRACT)


solid = part.part
